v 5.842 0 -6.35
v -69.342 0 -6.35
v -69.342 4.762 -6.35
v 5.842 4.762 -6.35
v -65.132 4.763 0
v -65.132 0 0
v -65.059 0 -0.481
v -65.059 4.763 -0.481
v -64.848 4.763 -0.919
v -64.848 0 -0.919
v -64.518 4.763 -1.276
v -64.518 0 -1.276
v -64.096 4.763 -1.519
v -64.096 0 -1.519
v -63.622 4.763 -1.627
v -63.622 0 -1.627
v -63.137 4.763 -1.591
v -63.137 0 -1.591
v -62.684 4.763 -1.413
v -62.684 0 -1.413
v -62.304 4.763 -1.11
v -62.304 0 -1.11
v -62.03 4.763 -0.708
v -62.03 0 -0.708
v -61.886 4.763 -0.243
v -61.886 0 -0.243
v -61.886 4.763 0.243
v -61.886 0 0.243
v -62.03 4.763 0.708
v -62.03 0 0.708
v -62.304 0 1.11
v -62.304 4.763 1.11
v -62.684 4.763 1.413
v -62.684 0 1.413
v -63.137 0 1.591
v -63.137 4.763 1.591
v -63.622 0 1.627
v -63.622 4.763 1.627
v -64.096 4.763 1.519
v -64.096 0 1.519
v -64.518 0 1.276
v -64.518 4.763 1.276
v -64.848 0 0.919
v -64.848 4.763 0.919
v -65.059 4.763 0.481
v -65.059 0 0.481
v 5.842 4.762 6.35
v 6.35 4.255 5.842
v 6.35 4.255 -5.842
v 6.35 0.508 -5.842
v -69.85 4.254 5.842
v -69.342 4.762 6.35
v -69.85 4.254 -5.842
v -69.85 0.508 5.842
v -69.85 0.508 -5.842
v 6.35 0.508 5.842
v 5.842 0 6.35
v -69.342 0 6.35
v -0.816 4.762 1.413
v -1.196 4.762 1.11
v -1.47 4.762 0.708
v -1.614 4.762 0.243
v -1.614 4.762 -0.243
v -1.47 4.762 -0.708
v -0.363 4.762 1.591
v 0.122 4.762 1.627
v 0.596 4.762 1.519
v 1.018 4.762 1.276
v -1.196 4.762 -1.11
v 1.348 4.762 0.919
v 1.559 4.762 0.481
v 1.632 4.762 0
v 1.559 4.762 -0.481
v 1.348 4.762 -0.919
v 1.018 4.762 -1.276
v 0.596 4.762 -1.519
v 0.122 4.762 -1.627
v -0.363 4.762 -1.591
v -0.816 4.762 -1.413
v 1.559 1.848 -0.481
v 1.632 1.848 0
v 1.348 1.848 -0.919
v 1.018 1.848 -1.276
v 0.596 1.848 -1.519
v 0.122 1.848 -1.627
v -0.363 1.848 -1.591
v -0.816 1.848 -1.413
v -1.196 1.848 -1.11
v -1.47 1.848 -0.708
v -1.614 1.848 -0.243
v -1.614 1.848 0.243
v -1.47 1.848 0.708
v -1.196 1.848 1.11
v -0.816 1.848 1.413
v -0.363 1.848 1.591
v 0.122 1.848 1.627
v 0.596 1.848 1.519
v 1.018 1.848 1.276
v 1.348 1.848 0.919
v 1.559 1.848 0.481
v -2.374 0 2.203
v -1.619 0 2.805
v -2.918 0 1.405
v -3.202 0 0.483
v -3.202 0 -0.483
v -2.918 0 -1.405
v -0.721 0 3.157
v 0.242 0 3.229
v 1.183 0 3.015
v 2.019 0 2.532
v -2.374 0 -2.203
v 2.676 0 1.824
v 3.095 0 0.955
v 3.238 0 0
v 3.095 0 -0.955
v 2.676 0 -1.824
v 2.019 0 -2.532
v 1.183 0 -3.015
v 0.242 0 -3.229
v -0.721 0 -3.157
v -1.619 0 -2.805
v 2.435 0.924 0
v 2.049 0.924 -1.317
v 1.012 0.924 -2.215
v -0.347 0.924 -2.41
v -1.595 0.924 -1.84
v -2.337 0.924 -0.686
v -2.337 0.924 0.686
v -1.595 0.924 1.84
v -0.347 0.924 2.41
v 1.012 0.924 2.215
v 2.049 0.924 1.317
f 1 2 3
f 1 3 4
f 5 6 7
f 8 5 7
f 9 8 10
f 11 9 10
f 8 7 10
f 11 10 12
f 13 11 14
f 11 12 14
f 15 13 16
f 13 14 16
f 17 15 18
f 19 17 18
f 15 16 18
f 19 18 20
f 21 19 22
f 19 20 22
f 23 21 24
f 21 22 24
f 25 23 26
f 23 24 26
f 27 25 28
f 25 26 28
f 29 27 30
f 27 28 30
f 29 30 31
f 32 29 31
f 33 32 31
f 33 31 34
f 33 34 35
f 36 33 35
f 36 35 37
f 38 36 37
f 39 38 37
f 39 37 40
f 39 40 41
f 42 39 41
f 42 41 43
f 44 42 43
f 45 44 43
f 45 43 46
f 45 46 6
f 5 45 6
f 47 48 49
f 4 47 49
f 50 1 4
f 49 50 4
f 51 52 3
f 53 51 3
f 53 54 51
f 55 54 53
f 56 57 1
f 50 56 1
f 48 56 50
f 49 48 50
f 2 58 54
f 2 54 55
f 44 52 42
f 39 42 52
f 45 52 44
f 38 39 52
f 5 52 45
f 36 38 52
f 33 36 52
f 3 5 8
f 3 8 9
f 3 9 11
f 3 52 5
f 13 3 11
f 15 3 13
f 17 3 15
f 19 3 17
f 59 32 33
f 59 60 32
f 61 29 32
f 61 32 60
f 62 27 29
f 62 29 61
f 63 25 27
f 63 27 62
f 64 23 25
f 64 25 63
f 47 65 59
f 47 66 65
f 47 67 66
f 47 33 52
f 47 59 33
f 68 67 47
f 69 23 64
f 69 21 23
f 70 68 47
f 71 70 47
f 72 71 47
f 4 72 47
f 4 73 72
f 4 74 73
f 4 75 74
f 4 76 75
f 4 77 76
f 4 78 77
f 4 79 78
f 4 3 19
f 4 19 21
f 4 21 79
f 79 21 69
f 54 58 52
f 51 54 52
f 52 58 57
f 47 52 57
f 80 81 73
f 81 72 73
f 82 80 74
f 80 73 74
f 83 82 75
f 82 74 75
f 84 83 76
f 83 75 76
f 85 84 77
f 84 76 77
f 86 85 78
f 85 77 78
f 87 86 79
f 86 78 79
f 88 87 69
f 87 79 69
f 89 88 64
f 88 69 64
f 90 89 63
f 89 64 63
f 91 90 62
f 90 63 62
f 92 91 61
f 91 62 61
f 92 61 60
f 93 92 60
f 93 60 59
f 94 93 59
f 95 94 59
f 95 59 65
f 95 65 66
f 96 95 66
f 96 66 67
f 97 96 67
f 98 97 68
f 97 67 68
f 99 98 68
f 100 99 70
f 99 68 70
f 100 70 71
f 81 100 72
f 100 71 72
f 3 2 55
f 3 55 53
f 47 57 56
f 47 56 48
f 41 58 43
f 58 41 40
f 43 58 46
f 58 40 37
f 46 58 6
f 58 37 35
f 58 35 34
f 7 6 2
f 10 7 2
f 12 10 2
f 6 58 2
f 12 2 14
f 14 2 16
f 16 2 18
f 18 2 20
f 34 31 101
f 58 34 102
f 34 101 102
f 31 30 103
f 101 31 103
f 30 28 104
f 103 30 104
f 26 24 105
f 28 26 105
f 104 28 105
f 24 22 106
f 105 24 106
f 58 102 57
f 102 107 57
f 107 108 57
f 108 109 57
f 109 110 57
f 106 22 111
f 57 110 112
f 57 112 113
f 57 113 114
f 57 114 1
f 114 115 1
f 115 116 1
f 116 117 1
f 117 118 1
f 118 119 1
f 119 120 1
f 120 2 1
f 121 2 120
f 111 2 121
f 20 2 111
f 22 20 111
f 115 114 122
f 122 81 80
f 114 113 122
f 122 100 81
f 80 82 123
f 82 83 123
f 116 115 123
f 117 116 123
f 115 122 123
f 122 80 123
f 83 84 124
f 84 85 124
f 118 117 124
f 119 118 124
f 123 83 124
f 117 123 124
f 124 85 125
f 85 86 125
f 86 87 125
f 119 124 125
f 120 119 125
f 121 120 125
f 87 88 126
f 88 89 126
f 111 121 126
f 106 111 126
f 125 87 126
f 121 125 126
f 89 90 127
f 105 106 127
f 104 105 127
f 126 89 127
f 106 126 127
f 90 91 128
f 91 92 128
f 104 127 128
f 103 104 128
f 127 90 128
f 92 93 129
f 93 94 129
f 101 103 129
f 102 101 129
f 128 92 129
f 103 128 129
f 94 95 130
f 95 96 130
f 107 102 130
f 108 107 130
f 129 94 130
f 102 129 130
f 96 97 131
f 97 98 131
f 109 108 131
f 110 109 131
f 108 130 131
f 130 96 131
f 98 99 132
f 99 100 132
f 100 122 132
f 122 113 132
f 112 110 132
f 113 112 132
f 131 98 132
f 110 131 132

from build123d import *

# Parameters (mm, degrees)
SKETCH1_W                                         = 76.2
SKETCH1_H                                         = 12.7
BOSS_EXTRUDE2_DEPTH                               = 4.7625
F_4_CLEARANCE_HOLE1_D                             = 3.2639
CSK_FOR_4_FLAT_HEAD_SOCKET_CAP_SCREW2_D           = 3.2639
CSK_FOR_4_FLAT_HEAD_SOCKET_CAP_SCREW2_CSINK_D     = 6.477
CSK_FOR_4_FLAT_HEAD_SOCKET_CAP_SCREW2_CSINK_ANGLE = 82
CHAMFER1_SIZE                                     = 0.508


with BuildPart() as part:
    # Sketch1 → Boss-Extrude2 (new body)
    with BuildSketch(Plane(origin=(0, 0, 0), x_dir=(1, 0, 0), z_dir=(0, 1, 0))):
        with Locations((-31.75, 0)):
            Rectangle(SKETCH1_W, SKETCH1_H)
    extrude(amount=BOSS_EXTRUDE2_DEPTH)

    # #4 Clearance Hole1 (through all)
    with Locations(Plane(origin=(0, 4.7625, 0), x_dir=(1, 0, 0), z_dir=(0, 1, 0))):
        with Locations((-63.5, 0)):
            Hole(F_4_CLEARANCE_HOLE1_D / 2)

    # CSK for #4 Flat Head Socket Cap Screw2 (through all)
    with Locations(Plane(origin=(0, 0, 0), x_dir=(-1, 0, 0), z_dir=(0, -1, 0))):
        with Locations((0, 0)):
            CounterSinkHole(CSK_FOR_4_FLAT_HEAD_SOCKET_CAP_SCREW2_D / 2, CSK_FOR_4_FLAT_HEAD_SOCKET_CAP_SCREW2_CSINK_D / 2, counter_sink_angle=CSK_FOR_4_FLAT_HEAD_SOCKET_CAP_SCREW2_CSINK_ANGLE)

    # Chamfer1
    chamfer1_edges = [part.edges().sort_by_distance(p)[0] for p in [
        (-69.85, 2.38125, 6.35),
        (-69.85, 2.38125, -6.35),
        (6.35, 2.38125, -6.35),
        (6.35, 2.38125, 6.35),
        (6.35, 4.7625, 0),
        (-69.85, 4.7625, 0),
        (-69.85, 0, 0),
        (6.35, 0, 0),
    ]]
    chamfer(chamfer1_edges, length=CHAMFER1_SIZE)


solid = part.part
